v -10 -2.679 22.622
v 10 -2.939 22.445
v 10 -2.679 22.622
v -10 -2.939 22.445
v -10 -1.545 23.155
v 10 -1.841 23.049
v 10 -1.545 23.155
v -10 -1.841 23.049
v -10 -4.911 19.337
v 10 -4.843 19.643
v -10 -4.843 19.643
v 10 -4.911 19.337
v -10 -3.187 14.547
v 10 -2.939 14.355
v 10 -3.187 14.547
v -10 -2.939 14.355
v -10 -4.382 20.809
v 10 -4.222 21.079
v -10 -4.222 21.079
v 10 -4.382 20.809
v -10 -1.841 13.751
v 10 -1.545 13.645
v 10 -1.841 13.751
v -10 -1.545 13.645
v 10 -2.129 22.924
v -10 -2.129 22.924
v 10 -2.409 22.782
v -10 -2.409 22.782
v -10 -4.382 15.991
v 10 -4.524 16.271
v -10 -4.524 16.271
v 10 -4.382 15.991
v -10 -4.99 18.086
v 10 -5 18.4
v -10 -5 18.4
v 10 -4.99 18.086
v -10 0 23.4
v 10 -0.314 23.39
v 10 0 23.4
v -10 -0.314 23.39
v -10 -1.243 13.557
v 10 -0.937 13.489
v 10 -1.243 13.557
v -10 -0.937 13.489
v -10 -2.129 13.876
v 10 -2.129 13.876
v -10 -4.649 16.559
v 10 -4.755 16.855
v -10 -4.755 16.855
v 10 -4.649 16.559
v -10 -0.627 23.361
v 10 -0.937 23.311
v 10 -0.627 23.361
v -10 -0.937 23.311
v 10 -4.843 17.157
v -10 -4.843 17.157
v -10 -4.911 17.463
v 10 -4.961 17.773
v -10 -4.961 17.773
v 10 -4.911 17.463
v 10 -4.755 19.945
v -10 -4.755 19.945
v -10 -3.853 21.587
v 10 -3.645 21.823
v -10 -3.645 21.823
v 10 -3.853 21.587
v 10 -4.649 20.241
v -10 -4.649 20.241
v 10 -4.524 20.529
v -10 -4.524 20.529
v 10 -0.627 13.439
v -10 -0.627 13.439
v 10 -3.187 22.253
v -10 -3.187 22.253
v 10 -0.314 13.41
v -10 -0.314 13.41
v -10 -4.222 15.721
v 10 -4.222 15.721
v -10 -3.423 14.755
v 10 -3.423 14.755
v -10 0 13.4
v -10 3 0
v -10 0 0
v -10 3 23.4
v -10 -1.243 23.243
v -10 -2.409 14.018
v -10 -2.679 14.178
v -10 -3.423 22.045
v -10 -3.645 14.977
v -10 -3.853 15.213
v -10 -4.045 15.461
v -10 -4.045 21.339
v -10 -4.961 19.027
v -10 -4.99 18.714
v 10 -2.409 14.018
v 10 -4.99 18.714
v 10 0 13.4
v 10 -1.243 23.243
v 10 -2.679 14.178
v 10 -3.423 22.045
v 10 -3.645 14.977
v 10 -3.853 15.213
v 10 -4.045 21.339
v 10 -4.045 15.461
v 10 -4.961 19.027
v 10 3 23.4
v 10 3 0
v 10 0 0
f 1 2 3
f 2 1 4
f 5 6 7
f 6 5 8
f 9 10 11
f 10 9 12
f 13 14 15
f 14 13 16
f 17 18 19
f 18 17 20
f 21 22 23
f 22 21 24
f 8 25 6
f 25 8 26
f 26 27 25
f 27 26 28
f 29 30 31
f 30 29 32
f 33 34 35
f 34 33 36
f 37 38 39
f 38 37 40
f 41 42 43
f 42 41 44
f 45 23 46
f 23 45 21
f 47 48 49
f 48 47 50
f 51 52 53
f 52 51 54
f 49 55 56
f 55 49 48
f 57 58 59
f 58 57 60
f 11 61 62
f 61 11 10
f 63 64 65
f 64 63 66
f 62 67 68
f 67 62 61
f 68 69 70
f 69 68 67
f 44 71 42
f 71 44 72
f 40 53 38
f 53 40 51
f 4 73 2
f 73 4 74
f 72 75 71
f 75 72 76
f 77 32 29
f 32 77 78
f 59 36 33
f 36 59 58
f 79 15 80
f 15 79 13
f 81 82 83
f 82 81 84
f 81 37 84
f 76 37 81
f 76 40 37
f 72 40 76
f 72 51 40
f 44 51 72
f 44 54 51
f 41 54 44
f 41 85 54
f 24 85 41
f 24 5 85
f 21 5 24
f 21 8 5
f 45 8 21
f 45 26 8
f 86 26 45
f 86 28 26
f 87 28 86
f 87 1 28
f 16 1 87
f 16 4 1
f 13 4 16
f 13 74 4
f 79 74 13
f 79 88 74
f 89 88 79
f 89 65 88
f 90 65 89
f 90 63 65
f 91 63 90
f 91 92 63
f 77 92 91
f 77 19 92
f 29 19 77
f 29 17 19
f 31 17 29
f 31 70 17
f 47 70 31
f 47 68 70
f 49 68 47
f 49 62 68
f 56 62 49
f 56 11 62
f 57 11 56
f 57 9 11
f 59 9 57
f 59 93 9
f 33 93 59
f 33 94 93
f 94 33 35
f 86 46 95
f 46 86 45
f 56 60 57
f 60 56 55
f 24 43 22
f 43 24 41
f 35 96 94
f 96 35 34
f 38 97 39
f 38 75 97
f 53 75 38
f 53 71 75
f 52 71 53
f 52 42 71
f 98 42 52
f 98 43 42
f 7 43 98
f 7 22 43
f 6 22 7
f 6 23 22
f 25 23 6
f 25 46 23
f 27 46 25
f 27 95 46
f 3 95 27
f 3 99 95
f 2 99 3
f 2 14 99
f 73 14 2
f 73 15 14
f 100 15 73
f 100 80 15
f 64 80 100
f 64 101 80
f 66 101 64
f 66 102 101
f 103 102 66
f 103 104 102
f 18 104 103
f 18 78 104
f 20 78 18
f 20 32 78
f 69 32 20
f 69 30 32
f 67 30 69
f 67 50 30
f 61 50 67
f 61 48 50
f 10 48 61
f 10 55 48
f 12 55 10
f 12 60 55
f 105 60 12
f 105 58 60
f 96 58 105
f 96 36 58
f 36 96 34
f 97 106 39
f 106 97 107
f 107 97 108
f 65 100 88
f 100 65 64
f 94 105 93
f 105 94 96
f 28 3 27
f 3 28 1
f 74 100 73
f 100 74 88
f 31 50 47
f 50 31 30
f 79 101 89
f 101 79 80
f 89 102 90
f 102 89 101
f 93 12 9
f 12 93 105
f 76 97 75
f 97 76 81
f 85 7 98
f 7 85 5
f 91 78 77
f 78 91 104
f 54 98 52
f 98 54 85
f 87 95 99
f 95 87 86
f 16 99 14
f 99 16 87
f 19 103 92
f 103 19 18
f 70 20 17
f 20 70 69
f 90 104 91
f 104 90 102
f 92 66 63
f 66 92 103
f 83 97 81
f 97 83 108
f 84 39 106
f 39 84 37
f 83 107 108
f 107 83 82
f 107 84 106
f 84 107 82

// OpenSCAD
// file: robot_settings.scad
main_box_x = 100; // 96
main_box_y = 102;
main_box_z = 74; // 74.5

lfp_main_box_x = 66;
lfp_main_box_y = 152;
lfp_main_box_z = 93;

wall_thickness = 5;

rail_gap = 2;
rail_inset = 7;

rail_thickness = 7;
rail_length = 250;
 rail_width = 260;

lfp_battery_width = 65.5;
lfp_battery_depth = 150.5;
lfp_battery_height = 93;
lfp_battery_midterrace_width = 64.8;
lfp_battery_midterrace_depth = 150.2;
lfp_battery_midterrace_height = 7.8;
lfp_battery_topterrace_width = 62.8;
lfp_battery_topterrace_depth = 149.4;
lfp_battery_topterrace_height = 6.6;

// red right
// black left
lfp_battery_terminal_width = 9.2;
lfp_battery_terminal_depth = 9.5;
lfp_battery_terminal_depth_setback = 4.4;
lfp_battery_terminal_width_setback = 5.9;

raspberry_pi_screw_seperation_y = 57;
raspberry_pi_screw_seperation_z = 48;
raspberry_pi_peg_h = 5;

battery_box_peg_h = 6;
battery_box_peg_d = 9.5;
battery_box_peg_cutout = 5;

gears_module = 1;
pinion_gear_teeth = 32;
pinion_gear_width = 5;
pinion_gear_bore = 8;

gears_setback_distance = 25;
gear_post_height = 2 * pinion_gear_width + rail_thickness + 8 ;

steering_motor_mount_x = 45;
steering_motor_mount_y = 36;
steering_motor_mount_z = 18;
steering_motor_mount_setback_distance = gears_setback_distance + 16;

dc_motor_drivertype = "Teyleten"; // Teyleten
isAdafruit = (dc_motor_drivertype == "Adafruit");

drv8871_x = isAdafruit ? 20.3 : 21.6;
drv8871_y = isAdafruit ?  24 : 25;

drv8871_z = 2;
drv8871_screw_d = 2.5;
drv8871_solder_points_z = 2;

drv8871mount_edge_x = 1.5;
drv8871mount_edge_wall = 3;
drv8871mount_z = 5;
drv8871mount_x = drv8871_x +  drv8871mount_edge_wall - 2* drv8871mount_edge_x;
drv8871mount_y = 19;

drv8871_screw_distance = 15.64;
drv8871_solder_points_d = 1.66;
drv8871_solder_offset_y = 4.4;
drv8871_solder_inner_points_distance = 5;
drv8871_solder_outer_points_distance = 12;

dc_motor_75_1_encoder_z = 14.75;
dc_motor_75_1_encoder_d = 24.5;
dc_motor_75_1_housing_z = 30;
dc_motor_75_1_housing_d = 24.1;
dc_motor_75_1_gearbox_z = 23;
dc_motor_75_1_gearbox_d = 24.8;
dc_motor_75_1_z = dc_motor_75_1_encoder_z + dc_motor_75_1_housing_z + dc_motor_75_1_gearbox_z;

dc_motor_housing_minus_encoder_z = 48;
dc_motor_encoder_z = 9.33;
dc_motor_encoder_wheel_d = 13.4;
dc_motor_encoder_wheel_thickness = 5;
dc_motor_encoder_wheel_gap = 3;
dc_motor_encoder_circuit_thickness = 2;
dc_motor_z = dc_motor_housing_minus_encoder_z + dc_motor_encoder_z + dc_motor_encoder_wheel_thickness + dc_motor_encoder_wheel_gap + dc_motor_encoder_circuit_thickness;
dc_motor_cutout_d = 24.8;
dc_motor_cutout_z = 19.5;


M3_shaft_d = 2.82;

dc_motor_screw_head_z = 2;
dc_motor_screw_head_d = 5.6;
dc_motor_screw_d = 3.2;
dc_motor_screw_offset = 8.5;

dc_motor_axle_ring_z = 3;
dc_motor_axle_ring_d = 7.2;
dc_motor_axle_cutout_d = 4.2;
dc_motor_axle_cutout_z = 10;
dc_motor_axle_notch_cutout = 0.4;
dc_motor_axle_notch_cutout_z = 6;

pdmount_x = 20;
pdmount_y = 30;
pdmount_z = 2;
pdmount_edge_x = 1.5;
pdmount_edge_wall = 3;

steering_shaft_z = 45;
steering_shaft_d = 7;
steering_shaft_motor_fitting_d = 9;
coupler_length = 24.6;
coupler_diameter = 14;
coupler_screw_d = 4;
coupler_screw_z_offset = 5;
coupler_gear_side_insert = 12.6;
steering_shaft_with_coupler_z = steering_shaft_z - coupler_gear_side_insert;

lidar_mount_y = 110;
lidar_mount_x = 65 + 20;
lidar_narrow_screws = 40;
lidar_wide_screws = 56;
lidar_front_to_back_screws = 70;
lidar_screw_d = 3;
lidar_circuitboard_x = 20;
lidar_circuitboard_y = 35;
lidar_circuitboard_z = 1.2;
lidar_cord_length = 29;

ball_bearing_height = 7;
ball_bearing_outer_diameter = 22;
ball_bearing_inner_diameter = 8;

M4_diameter = 5.1;
M3_diameter = 2.9;
M3_length = 35;
M3_cap_length= 3;
M3_cap_diameter = 5.44;

suspension_spring_outer_diameter = 8;
suspension_spring_inner_diameter = 5.3;

armature_holder_height = 20;
armature_holder_thickness = 8;
pull_bar_peg_r = 3.2;
apparatus_locking_peg_d = 4;

rack_module = 1;
rack_length = main_box_x;
rack_height = 5;
rack_width = 10;
rack_teeth = 30;
rack_bore = 3;

pull_bar_length = rail_width / 2 - rack_length + 1;

// tire hardware
axle_length = 24 + ball_bearing_height; 
axle_reciever_inner_diameter = 8.2;
axle_reciever_outer_diameter = 12;
axle_reciever_length = 18.8;
axle_notch_length = 15;
axle_notch_cutout = 2.4;

// power distribution bar
power_bar_cutout_x = 96;
power_bar_y = 19.1;
power_bar_z = 1.5;
power_bar_screw_distance = 91.4;
power_bar_screw_d = 2.8;
power_bar_standoff_z = 5;
power_bar_standoff_d = 6.83;

pico_expander_width = 63;
pico_expander_height = 57;
pico_screw_hole_offset = 3;
pico_screw_hole_d = 2.5;

usbhub_thickness = 11.7;
usbhub_depth = 37.5;
usbhub_width = 86.7;
usbhub_end_port_width = 14.8;
usbhub_end_port_height = 12;
usbhub_front_face_safe_zone_left = 15;
usbhub_front_face_safe_zone_right = 14.8;

switch_w = 16;
switch_cutout_d = 12.2;
switch_bump_h = 2;
switch_bump_l = 18.2;

i2c_mount_thickness = 3;
i2c_w = 28;
i2c_l = 28;
i2c_circuitboard_thickness = 1.23;
i2c_bottom_notch_w = 14.35;
i2c_bottom_notch_depth = 1;
i2c_screw_hole_d = 1.9;
i2c_screw_hole_offset = 1.4;
i2c_pin_l = 11;
i2c_pin_d = 0.8;
i2c_pin_offset = 1.5;
i2c_pin_separation = 2.5;
i2c_all_pins_l = 8.3;
i2c_screen_thickness = 1.88;
i2c_screen_w = 14.6;
i2c_screen_d = 27;
i2c_screen_offset = 4.1;
// main file
include <robot_settings.scad>

$fn=100;

wedge_thickness = 3;

translate([-10, 0, 0])
cube([20, wedge_thickness, 2 * usbhub_thickness]);

// make it easier to install and remove
translate([0, 0, 2 * usbhub_thickness -5])
difference() {
  translate([-10, 0, 0])
  rotate([0, 90, 0])
  cylinder(h = 20, d = 10);

  translate([-11, 0, -5])
  cube([22, 5, 10]);
}
